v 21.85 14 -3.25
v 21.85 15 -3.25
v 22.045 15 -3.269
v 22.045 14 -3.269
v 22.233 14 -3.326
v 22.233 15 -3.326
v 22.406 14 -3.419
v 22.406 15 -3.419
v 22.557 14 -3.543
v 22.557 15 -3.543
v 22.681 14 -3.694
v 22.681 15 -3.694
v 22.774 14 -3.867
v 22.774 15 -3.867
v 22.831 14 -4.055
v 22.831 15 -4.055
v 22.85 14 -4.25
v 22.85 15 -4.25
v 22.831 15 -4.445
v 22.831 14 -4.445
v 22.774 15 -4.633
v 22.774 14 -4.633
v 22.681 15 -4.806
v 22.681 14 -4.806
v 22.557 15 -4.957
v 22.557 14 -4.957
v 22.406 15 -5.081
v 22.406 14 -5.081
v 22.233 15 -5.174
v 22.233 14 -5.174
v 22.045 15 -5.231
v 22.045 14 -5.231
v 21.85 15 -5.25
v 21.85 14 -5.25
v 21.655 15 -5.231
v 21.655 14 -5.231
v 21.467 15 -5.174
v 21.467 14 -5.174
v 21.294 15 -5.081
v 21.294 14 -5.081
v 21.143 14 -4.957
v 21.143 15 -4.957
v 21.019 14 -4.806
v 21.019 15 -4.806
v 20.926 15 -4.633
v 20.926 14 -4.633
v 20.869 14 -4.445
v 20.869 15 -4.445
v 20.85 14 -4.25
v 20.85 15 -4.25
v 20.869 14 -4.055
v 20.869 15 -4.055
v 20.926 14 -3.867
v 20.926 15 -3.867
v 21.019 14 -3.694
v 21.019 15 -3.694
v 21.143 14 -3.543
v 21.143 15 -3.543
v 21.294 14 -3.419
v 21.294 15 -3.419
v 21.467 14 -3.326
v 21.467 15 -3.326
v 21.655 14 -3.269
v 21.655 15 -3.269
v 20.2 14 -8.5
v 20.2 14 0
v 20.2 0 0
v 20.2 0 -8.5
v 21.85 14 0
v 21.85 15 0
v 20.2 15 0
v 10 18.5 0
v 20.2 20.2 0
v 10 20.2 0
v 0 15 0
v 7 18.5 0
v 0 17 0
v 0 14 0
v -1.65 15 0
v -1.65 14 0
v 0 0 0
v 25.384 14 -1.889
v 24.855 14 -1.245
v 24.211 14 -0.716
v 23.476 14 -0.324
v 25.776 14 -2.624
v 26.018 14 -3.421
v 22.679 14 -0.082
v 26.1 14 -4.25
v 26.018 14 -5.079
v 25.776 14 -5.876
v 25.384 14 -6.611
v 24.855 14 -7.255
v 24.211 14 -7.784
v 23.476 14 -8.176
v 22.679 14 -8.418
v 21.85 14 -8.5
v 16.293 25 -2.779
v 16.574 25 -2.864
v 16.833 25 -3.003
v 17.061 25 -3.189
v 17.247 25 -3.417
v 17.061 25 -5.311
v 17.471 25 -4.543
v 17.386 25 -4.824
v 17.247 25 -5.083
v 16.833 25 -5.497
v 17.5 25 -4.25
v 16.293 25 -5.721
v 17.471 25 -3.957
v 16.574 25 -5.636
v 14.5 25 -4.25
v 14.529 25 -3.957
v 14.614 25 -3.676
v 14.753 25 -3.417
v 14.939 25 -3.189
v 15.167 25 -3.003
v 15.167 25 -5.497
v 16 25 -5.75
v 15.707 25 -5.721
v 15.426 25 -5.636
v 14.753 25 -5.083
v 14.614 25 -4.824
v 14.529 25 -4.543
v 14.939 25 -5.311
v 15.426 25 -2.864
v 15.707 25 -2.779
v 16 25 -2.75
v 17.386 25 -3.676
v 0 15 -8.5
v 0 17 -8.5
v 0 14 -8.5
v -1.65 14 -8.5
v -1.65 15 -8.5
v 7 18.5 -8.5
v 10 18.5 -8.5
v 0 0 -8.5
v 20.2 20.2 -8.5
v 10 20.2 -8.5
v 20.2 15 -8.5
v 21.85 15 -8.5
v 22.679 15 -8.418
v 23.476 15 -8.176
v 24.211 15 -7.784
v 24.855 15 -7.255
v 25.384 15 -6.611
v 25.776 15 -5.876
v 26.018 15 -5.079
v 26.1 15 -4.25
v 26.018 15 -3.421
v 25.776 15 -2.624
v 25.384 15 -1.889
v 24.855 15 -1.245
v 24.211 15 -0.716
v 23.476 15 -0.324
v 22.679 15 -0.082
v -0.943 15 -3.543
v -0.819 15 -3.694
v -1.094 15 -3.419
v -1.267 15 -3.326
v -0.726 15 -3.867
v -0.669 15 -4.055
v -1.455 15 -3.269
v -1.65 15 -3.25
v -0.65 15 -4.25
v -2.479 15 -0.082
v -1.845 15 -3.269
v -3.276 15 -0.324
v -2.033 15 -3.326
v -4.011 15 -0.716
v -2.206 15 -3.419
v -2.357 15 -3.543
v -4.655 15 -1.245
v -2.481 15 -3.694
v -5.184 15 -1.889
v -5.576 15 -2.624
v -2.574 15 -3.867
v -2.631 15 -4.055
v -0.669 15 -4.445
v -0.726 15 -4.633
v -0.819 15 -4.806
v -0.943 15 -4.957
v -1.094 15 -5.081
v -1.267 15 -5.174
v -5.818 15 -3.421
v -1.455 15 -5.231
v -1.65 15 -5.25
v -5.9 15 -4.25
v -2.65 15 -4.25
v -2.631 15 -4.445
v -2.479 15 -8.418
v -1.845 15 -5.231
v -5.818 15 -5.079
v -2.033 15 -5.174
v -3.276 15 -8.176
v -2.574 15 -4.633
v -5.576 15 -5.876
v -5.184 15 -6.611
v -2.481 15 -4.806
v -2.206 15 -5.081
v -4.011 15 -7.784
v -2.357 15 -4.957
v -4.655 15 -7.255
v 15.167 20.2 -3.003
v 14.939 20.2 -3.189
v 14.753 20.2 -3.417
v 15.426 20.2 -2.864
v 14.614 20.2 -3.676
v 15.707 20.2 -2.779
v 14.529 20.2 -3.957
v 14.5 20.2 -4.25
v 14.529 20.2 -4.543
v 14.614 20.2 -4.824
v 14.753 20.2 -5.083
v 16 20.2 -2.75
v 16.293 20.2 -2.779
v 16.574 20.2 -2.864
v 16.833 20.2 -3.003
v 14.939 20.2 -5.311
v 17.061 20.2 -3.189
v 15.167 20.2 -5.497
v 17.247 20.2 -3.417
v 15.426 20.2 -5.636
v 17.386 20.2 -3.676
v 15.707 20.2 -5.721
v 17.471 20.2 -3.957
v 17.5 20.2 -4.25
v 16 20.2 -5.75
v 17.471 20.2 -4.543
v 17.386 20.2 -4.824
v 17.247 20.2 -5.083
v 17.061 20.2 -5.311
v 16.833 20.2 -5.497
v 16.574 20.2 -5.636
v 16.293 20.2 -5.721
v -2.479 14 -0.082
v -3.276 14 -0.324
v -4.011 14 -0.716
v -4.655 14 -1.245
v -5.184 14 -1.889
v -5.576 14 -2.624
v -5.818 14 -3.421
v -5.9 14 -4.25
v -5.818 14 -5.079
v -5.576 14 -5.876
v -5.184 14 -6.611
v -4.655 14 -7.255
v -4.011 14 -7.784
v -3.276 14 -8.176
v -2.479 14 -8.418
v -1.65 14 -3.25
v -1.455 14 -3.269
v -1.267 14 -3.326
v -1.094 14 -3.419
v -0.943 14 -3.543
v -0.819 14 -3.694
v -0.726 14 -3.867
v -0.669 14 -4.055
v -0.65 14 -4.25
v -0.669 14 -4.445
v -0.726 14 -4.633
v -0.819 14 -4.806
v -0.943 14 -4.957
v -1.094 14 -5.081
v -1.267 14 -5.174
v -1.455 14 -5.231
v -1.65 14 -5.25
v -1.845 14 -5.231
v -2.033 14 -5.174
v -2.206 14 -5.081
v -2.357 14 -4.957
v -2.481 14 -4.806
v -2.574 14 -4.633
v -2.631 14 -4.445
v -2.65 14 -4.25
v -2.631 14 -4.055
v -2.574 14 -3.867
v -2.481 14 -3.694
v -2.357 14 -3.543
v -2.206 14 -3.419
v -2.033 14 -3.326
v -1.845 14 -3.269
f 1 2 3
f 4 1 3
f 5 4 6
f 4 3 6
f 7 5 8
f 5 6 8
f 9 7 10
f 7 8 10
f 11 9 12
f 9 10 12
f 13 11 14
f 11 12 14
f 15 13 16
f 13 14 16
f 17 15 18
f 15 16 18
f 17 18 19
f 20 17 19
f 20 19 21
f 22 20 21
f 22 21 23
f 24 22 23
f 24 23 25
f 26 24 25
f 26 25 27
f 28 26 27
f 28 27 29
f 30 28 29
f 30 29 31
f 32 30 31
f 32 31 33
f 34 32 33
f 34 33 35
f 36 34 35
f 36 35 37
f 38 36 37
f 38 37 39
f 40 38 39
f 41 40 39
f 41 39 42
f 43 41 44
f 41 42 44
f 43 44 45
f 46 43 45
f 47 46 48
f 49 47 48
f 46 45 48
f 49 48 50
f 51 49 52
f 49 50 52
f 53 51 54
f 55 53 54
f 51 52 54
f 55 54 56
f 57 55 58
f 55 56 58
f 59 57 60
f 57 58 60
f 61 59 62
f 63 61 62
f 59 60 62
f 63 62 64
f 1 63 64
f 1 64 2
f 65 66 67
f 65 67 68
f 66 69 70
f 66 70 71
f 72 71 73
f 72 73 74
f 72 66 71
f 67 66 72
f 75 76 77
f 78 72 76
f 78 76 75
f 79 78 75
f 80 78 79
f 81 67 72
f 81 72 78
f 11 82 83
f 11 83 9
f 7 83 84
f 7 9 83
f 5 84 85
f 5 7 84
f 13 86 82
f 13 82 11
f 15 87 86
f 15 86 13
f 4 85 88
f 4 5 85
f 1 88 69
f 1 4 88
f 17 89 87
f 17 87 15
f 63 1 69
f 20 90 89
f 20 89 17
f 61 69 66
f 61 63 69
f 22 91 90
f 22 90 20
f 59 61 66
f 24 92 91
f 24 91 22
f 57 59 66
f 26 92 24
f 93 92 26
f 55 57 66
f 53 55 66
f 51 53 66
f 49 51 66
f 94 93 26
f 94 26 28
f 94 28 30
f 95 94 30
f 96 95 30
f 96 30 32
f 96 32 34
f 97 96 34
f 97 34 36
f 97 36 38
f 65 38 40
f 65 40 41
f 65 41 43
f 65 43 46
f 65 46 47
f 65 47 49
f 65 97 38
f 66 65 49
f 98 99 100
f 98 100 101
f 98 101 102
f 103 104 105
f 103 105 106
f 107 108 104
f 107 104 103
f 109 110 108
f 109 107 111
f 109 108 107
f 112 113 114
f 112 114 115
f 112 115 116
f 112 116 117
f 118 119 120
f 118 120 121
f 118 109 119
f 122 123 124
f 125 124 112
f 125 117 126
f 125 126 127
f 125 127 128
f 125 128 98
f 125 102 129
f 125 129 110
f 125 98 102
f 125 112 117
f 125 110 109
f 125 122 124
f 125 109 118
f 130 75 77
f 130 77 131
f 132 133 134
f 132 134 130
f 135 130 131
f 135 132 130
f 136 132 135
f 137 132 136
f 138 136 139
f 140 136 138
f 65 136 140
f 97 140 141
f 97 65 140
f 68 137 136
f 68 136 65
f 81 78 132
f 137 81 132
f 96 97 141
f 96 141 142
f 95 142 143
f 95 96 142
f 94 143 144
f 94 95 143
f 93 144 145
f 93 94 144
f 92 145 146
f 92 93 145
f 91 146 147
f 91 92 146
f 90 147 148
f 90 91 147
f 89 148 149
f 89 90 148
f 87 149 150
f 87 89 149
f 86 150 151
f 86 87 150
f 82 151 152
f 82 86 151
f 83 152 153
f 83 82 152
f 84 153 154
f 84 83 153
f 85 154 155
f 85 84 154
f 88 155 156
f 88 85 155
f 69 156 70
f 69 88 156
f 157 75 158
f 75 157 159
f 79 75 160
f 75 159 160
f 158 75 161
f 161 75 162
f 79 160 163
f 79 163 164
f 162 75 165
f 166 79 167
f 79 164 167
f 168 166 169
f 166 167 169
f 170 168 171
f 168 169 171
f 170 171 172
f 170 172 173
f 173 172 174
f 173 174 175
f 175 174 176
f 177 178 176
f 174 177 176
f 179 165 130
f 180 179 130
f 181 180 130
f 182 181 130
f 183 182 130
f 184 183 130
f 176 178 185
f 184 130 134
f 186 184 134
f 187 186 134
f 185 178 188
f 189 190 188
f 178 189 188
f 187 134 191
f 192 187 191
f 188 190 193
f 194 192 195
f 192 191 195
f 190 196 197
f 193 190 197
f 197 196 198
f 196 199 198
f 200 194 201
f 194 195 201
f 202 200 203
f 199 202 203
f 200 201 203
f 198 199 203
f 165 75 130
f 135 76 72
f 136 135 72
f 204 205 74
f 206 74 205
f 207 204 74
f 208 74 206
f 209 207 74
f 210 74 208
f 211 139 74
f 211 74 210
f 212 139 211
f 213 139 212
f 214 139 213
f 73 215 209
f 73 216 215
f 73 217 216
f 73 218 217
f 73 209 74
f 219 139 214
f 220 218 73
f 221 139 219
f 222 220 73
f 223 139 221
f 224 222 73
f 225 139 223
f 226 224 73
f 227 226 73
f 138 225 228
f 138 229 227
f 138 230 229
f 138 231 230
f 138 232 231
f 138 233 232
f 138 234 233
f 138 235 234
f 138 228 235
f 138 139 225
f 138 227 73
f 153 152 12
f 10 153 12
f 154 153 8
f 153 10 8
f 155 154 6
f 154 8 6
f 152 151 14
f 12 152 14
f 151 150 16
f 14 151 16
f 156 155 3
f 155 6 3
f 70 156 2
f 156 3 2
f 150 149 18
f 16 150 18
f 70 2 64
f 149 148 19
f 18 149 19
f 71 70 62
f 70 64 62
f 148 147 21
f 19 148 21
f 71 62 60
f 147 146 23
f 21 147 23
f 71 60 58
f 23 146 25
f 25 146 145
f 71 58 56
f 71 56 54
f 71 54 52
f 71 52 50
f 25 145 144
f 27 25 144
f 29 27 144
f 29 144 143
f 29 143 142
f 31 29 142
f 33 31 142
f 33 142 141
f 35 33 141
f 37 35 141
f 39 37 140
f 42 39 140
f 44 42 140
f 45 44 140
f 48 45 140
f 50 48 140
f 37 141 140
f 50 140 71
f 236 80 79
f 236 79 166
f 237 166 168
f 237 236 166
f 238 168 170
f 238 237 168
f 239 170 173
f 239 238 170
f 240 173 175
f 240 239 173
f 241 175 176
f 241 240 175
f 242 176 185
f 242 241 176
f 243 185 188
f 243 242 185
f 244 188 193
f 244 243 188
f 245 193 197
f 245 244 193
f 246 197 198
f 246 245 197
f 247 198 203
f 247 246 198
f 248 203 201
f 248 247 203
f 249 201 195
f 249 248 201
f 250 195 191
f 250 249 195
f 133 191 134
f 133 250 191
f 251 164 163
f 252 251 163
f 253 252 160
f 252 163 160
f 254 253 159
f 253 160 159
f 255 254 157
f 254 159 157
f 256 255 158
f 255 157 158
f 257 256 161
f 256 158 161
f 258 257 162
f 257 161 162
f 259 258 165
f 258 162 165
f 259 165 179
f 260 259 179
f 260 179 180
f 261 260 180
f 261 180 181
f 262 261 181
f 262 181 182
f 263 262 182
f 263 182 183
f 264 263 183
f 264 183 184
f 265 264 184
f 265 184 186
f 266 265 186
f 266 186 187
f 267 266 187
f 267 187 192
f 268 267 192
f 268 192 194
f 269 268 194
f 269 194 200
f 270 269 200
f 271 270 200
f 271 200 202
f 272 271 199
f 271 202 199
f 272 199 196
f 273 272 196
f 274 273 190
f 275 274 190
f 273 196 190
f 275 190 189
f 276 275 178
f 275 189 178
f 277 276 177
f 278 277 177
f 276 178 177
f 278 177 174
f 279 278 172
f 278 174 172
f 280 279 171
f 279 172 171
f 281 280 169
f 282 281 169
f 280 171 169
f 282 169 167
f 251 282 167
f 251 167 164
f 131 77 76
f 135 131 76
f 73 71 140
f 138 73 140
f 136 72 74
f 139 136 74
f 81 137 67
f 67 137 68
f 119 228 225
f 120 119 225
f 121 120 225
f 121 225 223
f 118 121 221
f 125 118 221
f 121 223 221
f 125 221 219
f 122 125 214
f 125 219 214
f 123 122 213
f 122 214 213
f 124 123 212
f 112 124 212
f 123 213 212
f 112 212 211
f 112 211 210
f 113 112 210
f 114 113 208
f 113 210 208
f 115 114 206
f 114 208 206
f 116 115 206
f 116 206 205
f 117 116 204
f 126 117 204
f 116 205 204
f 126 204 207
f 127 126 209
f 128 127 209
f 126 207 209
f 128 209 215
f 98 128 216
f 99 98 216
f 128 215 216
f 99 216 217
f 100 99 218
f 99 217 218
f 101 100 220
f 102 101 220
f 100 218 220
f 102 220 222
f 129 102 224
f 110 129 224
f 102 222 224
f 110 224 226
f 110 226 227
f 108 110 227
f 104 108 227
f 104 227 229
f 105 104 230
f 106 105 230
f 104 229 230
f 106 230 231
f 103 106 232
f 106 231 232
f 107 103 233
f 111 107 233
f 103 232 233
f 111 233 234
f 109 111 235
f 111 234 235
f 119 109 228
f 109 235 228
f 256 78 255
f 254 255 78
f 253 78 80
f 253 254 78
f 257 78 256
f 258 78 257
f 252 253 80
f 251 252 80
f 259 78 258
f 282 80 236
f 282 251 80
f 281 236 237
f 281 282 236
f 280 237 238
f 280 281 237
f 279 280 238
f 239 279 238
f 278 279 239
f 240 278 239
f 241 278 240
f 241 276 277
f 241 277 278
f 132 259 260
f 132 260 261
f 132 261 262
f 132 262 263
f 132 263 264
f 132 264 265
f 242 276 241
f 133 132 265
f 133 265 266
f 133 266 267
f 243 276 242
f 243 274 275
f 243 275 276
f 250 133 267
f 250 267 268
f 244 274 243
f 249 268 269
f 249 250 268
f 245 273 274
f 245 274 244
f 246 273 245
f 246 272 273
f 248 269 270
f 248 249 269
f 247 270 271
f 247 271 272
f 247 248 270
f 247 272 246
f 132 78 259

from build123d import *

# Parameters (mm, degrees)
SKETCH1_W           = 20.2
SKETCH1_H           = 8.5
BOSS_EXTRUDE1_DEPTH = 14
BOSS_EXTRUDE2_DEPTH = 1
SKETCH3_W           = 20.2
SKETCH3_H           = 8.5
BOSS_EXTRUDE3_DEPTH = 5.2
CUT_EXTRUDE1_DEPTH  = 20.2
SKETCH5_R           = 1
CUT_EXTRUDE2_DEPTH  = 32.280345267
SKETCH6_R           = 1.5
BOSS_EXTRUDE4_DEPTH = 4.8


with BuildPart() as part:
    # Sketch1 → Boss-Extrude1 (new body)
    with BuildSketch(Plane(origin=(0, 0, 0), x_dir=(1, 0, 0), z_dir=(0, 1, 0))):
        with Locations((10.1, 4.25)):
            Rectangle(SKETCH1_W, SKETCH1_H)
    extrude(amount=BOSS_EXTRUDE1_DEPTH)

    # Sketch2 → Boss-Extrude2 (add)
    with BuildSketch(Plane(origin=(0, 14, 0), x_dir=(1, 0, 0), z_dir=(0, 1, 0))):
        with BuildLine():
            Line((-1.65, 8.5), (21.85, 8.5))
            ThreePointArc((21.85, 8.5), (26.1, 4.25), (21.85, 0))
            Line((21.85, 0), (-1.65, 0))
            ThreePointArc((-1.65, 0), (-5.9, 4.25), (-1.65, 8.5))
        make_face()
    extrude(amount=BOSS_EXTRUDE2_DEPTH)

    # Sketch3 → Boss-Extrude3 (add)
    with BuildSketch(Plane(origin=(0, 15, 0), x_dir=(1, 0, 0), z_dir=(0, 1, 0))):
        with Locations((10.1, 4.25)):
            Rectangle(SKETCH3_W, SKETCH3_H)
    extrude(amount=BOSS_EXTRUDE3_DEPTH)

    # Sketch4 → Cut-Extrude1 (cut)
    with BuildSketch(Plane.XY):
        Polygon((0, 17), (7, 18.5), (10, 18.5), (10, 20.2), (20.2, 20.2), (20.2, 17.6), (23.419390589, 17.6), (23.419390589, 23.763762674), (-0.815558956, 23.763762674), align=None)
    extrude(amount=-CUT_EXTRUDE1_DEPTH, mode=Mode.SUBTRACT)

    # Sketch5 → Cut-Extrude2 (cut, through all)
    with BuildSketch(Plane(origin=(0, 15, 0), x_dir=(1, 0, 0), z_dir=(0, 1, 0))):
        with Locations(Location((-1.65, 4.25, 0), (0, 0, 270))):
            Circle(SKETCH5_R)
        with Locations(Location((21.85, 4.25, 0), (0, 0, 270))):
            Circle(SKETCH5_R)
    extrude(amount=-CUT_EXTRUDE2_DEPTH, mode=Mode.SUBTRACT)

    # Sketch6 → Boss-Extrude4 (add)
    with BuildSketch(Plane(origin=(0, 20.2, 0), x_dir=(1, 0, 0), z_dir=(0, 1, 0))):
        with Locations(Location((16, 4.25, 0), (0, 0, 90))):
            Circle(SKETCH6_R)
    extrude(amount=BOSS_EXTRUDE4_DEPTH)


solid = part.part
